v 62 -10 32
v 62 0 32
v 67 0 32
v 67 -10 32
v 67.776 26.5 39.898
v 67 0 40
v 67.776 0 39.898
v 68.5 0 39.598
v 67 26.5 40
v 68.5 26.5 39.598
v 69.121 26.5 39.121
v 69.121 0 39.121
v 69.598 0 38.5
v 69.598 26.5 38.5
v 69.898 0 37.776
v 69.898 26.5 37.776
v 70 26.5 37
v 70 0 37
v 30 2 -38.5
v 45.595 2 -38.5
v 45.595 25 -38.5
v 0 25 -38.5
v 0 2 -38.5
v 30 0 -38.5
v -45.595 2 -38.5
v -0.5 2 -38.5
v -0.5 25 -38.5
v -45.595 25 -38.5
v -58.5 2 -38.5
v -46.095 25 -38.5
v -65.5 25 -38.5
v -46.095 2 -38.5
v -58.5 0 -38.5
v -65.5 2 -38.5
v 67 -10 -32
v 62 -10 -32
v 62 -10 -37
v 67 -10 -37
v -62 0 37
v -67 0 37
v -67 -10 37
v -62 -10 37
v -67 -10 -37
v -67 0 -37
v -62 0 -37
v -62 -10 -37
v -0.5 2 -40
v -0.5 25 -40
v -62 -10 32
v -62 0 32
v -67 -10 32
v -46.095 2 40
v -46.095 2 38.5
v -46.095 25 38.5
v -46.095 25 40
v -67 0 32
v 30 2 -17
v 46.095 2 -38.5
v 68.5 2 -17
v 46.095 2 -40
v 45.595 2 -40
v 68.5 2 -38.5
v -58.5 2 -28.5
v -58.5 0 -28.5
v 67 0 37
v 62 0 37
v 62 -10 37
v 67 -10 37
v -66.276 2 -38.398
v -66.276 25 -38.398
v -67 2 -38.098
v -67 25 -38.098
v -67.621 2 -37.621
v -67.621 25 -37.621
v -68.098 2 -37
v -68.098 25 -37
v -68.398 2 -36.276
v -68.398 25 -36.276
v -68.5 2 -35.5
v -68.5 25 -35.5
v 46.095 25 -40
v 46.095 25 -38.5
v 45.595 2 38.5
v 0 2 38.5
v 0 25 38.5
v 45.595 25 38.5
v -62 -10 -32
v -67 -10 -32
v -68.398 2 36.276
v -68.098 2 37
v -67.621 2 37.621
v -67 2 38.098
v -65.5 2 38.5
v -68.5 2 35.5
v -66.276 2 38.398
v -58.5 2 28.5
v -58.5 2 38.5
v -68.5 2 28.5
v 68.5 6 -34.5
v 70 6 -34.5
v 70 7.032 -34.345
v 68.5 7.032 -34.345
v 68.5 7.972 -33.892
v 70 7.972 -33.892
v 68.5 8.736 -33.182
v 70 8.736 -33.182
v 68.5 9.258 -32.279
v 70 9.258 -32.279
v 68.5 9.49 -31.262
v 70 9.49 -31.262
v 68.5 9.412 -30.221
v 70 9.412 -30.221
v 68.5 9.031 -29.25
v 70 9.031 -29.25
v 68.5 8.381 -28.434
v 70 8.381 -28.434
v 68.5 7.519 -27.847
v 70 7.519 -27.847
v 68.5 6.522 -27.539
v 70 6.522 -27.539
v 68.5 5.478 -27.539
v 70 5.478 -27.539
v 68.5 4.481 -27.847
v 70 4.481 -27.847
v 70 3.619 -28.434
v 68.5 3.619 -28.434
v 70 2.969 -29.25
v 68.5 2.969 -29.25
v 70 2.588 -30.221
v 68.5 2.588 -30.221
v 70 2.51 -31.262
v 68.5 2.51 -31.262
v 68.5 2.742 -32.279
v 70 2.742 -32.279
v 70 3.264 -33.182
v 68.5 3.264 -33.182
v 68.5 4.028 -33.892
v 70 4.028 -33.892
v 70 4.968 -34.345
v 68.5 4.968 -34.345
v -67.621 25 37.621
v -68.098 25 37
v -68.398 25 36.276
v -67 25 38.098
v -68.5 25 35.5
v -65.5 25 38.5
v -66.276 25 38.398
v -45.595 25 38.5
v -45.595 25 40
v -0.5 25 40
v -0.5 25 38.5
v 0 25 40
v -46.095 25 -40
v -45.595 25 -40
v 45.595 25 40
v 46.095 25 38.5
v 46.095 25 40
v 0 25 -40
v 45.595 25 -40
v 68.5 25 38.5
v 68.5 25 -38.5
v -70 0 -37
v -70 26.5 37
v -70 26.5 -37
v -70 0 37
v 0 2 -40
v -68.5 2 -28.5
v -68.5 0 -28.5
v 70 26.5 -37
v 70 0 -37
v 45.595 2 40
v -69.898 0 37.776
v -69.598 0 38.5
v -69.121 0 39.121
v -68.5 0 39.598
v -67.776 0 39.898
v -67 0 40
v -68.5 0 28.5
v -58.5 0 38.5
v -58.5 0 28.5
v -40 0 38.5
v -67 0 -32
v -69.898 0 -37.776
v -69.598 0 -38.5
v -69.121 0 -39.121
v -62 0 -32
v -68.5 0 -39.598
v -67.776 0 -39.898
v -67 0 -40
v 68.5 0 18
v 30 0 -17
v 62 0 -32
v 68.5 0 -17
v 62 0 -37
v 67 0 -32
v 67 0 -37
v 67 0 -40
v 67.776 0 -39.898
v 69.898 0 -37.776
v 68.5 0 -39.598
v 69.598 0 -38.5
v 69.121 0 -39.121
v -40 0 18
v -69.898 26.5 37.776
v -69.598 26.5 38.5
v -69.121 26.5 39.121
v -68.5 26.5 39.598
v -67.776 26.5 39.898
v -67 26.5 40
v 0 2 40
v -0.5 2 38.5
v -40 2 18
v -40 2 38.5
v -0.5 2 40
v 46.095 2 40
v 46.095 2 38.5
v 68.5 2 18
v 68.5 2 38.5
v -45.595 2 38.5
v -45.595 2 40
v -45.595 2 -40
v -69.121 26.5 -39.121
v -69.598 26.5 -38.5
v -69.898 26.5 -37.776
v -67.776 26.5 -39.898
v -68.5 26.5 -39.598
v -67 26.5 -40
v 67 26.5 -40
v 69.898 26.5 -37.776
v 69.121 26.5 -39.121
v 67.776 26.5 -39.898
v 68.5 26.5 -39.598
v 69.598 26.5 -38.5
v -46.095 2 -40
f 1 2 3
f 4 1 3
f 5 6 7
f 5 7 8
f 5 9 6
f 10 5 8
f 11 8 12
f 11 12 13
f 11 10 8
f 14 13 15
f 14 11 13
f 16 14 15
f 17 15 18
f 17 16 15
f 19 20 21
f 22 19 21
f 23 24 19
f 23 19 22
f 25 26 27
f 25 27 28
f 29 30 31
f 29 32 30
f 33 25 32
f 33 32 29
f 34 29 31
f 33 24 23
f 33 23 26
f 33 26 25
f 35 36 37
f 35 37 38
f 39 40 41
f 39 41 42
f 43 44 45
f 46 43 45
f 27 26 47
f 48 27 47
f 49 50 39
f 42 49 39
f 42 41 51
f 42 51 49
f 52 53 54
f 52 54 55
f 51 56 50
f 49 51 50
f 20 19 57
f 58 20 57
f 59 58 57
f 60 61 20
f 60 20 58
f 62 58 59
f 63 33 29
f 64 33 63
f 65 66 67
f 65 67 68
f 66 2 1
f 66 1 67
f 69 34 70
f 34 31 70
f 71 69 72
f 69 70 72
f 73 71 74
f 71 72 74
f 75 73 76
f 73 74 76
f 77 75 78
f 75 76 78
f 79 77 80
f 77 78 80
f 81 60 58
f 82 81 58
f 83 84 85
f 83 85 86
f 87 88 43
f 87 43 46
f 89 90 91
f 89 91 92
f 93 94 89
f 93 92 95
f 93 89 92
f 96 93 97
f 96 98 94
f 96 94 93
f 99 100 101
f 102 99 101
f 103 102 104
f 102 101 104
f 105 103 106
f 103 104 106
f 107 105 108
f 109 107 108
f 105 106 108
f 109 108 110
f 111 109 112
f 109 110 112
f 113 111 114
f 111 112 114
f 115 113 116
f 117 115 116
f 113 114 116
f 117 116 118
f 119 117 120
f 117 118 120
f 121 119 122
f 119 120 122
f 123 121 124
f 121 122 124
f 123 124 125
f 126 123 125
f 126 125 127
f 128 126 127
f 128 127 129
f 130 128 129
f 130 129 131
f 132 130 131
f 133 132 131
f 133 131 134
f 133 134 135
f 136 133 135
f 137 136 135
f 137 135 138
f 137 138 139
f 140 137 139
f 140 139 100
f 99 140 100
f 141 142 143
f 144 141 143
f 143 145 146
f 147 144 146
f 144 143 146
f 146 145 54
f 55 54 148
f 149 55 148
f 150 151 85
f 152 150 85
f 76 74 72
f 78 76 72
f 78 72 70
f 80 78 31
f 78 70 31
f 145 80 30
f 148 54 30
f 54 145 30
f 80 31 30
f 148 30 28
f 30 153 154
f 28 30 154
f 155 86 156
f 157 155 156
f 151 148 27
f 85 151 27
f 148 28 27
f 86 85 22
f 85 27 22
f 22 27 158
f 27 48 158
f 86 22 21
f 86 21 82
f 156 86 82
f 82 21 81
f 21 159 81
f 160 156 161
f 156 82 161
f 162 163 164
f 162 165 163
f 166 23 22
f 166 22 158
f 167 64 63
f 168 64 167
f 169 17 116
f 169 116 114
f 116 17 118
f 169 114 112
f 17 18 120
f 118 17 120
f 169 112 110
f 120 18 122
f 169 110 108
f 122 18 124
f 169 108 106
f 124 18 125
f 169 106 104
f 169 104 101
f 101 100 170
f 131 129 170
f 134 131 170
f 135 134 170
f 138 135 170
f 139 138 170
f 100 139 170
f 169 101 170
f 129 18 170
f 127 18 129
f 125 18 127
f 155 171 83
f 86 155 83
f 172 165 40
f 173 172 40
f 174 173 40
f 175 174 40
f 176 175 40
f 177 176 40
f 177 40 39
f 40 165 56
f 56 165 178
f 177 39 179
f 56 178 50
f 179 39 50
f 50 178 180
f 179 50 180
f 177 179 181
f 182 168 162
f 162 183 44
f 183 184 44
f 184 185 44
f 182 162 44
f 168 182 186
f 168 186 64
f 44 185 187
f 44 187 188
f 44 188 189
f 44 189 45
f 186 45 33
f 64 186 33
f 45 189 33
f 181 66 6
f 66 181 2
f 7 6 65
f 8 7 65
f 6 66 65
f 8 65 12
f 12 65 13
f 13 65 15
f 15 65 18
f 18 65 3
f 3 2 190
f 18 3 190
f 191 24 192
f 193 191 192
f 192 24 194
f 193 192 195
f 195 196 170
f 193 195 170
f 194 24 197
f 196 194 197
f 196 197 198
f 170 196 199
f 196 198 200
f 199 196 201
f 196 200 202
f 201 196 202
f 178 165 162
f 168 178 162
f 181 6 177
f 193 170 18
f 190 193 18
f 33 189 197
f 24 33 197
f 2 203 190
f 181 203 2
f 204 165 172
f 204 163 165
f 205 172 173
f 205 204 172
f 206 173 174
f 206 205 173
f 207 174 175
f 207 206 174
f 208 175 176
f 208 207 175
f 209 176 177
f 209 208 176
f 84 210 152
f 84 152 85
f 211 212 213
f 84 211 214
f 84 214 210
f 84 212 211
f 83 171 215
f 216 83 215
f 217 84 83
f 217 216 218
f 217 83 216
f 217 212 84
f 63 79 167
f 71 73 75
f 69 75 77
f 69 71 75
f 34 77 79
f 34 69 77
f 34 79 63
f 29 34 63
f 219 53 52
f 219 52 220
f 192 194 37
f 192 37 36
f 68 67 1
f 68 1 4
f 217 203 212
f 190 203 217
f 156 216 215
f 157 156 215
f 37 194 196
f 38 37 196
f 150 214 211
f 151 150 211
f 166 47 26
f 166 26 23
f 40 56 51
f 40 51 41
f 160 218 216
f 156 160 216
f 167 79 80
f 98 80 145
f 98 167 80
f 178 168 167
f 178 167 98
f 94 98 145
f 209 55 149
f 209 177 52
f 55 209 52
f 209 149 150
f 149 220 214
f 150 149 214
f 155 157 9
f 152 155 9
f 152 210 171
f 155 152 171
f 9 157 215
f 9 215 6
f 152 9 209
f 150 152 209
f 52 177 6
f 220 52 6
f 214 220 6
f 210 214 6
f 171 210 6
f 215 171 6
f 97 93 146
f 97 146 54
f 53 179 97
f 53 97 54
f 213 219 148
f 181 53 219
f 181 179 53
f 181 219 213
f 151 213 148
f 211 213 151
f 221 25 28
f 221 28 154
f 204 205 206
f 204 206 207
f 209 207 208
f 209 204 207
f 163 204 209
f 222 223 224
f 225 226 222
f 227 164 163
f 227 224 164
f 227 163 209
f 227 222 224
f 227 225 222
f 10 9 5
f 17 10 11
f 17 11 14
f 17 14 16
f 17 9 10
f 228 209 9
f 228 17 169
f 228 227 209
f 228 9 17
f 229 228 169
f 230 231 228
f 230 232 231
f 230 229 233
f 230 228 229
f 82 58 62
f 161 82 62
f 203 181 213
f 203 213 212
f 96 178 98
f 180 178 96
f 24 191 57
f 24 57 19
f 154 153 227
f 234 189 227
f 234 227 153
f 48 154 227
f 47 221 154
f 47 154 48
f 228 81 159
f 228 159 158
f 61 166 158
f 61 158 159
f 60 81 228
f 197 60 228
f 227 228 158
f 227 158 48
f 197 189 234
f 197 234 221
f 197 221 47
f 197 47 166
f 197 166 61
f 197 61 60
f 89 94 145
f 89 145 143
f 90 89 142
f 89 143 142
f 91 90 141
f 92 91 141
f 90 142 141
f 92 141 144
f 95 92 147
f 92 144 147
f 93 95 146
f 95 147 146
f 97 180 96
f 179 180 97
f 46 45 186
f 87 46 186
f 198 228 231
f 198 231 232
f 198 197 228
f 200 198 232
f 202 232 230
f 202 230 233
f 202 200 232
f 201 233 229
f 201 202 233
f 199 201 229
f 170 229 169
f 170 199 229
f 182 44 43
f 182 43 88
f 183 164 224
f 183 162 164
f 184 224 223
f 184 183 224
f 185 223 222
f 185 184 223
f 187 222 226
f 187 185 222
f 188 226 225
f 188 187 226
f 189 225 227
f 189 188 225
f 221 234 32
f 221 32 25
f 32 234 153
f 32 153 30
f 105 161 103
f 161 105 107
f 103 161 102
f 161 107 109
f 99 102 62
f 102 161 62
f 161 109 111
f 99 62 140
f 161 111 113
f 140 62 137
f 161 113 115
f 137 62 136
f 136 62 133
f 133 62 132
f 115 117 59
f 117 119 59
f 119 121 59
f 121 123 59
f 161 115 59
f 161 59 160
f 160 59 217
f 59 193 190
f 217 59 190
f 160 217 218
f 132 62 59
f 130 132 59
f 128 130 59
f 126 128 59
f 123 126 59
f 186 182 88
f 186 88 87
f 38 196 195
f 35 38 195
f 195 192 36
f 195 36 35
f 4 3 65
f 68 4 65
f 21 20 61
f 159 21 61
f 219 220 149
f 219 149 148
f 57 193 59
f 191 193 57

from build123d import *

# Parameters (mm, degrees)
SKETCH1_W           = 140
SKETCH1_H           = 80
BOSS_EXTRUDE1_DEPTH = 2
SKETCH2_W           = 45.094685242
SKETCH2_H           = 1.5
SKETCH2_W_2         = 45.594685242
BOSS_EXTRUDE3_DEPTH = 23
SKETCH3_W           = 140
SKETCH3_H           = 80
BOSS_EXTRUDE4_DEPTH = 1.5
SKETCH4_R           = 3.5
CUT_EXTRUDE1_DEPTH  = 5
FILLET1_R           = 3
SKETCH5_W           = 5
SKETCH5_H           = 5
BOSS_EXTRUDE5_DEPTH = 10


with BuildPart() as part:
    # Sketch1 → Boss-Extrude1 (new body)
    with BuildSketch(Plane(origin=(0, 0, 0), x_dir=(1, 0, 0), z_dir=(0, 1, 0))):
        Rectangle(SKETCH1_W, SKETCH1_H)
        Polygon((68.5, -18), (68.5, 17), (30, 17), (30, 38.5), (-58.5, 38.5), (-58.5, 28.5), (-68.5, 28.5), (-68.5, -28.5), (-58.5, -28.5), (-58.5, -38.5), (-40, -38.5), (-40, -18), align=None, mode=Mode.SUBTRACT)
    extrude(amount=BOSS_EXTRUDE1_DEPTH)

    # Sketch2 → Boss-Extrude3 (add)
    with BuildSketch(Plane(origin=(0, 2, 0), x_dir=(1, 0, 0), z_dir=(0, 1, 0))):
        with Locations((-23.047342621, 39.25)):
            Rectangle(SKETCH2_W, SKETCH2_H)
        with Locations((-23.047342621, -39.25)):
            Rectangle(SKETCH2_W, SKETCH2_H)
        Polygon((-46.094685242, 40), (-46.094685242, 38.5), (-68.5, 38.5), (-68.5, -38.5), (-46.094685242, -38.5), (-46.094685242, -40), (-70, -40), (-70, 40), align=None)
        with Locations((22.797342621, -39.25)):
            Rectangle(SKETCH2_W_2, SKETCH2_H)
        Polygon((46.094685242, -38.5), (46.094685242, -40), (70, -40), (70, 40), (46.094685242, 40), (46.094685242, 38.5), (68.5, 38.5), (68.5, -38.5), align=None)
        with Locations((22.797342621, 39.25)):
            Rectangle(SKETCH2_W_2, SKETCH2_H)
    extrude(amount=BOSS_EXTRUDE3_DEPTH)

    # Sketch3 → Boss-Extrude4 (add)
    with BuildSketch(Plane(origin=(0, 25, 0), x_dir=(1, 0, 0), z_dir=(0, 1, 0))):
        Rectangle(SKETCH3_W, SKETCH3_H)
    extrude(amount=BOSS_EXTRUDE4_DEPTH)

    # Sketch4 → Cut-Extrude1 (cut)
    with BuildSketch(Plane(origin=(70, 0, 0), x_dir=(0, 0, -1), z_dir=(1, 0, 0))):
        with Locations((31, 6)):
            Circle(SKETCH4_R)
    extrude(amount=-CUT_EXTRUDE1_DEPTH, mode=Mode.SUBTRACT)

    # Fillet1
    fillet1_edges = [part.edges().sort_by_distance(p)[0] for p in [
        (70, 13.25, 40),
        (-70, 13.25, 40),
        (-70, 13.25, -40),
        (70, 13.25, -40),
        (-68.5, 13.5, 38.5),
        (-68.5, 13.5, -38.5),
    ]]
    fillet(fillet1_edges, radius=FILLET1_R)

    # Sketch5 → Boss-Extrude5 (add)
    with BuildSketch(Plane.XZ):
        with Locations((-64.5, 34.5)):
            Rectangle(SKETCH5_W, SKETCH5_H)
        with Locations((64.5, 34.5)):
            Rectangle(SKETCH5_W, SKETCH5_H)
        with Locations((64.5, -34.5)):
            Rectangle(SKETCH5_W, SKETCH5_H)
        with Locations((-64.5, -34.5)):
            Rectangle(SKETCH5_W, SKETCH5_H)
    extrude(amount=BOSS_EXTRUDE5_DEPTH)


solid = part.part
